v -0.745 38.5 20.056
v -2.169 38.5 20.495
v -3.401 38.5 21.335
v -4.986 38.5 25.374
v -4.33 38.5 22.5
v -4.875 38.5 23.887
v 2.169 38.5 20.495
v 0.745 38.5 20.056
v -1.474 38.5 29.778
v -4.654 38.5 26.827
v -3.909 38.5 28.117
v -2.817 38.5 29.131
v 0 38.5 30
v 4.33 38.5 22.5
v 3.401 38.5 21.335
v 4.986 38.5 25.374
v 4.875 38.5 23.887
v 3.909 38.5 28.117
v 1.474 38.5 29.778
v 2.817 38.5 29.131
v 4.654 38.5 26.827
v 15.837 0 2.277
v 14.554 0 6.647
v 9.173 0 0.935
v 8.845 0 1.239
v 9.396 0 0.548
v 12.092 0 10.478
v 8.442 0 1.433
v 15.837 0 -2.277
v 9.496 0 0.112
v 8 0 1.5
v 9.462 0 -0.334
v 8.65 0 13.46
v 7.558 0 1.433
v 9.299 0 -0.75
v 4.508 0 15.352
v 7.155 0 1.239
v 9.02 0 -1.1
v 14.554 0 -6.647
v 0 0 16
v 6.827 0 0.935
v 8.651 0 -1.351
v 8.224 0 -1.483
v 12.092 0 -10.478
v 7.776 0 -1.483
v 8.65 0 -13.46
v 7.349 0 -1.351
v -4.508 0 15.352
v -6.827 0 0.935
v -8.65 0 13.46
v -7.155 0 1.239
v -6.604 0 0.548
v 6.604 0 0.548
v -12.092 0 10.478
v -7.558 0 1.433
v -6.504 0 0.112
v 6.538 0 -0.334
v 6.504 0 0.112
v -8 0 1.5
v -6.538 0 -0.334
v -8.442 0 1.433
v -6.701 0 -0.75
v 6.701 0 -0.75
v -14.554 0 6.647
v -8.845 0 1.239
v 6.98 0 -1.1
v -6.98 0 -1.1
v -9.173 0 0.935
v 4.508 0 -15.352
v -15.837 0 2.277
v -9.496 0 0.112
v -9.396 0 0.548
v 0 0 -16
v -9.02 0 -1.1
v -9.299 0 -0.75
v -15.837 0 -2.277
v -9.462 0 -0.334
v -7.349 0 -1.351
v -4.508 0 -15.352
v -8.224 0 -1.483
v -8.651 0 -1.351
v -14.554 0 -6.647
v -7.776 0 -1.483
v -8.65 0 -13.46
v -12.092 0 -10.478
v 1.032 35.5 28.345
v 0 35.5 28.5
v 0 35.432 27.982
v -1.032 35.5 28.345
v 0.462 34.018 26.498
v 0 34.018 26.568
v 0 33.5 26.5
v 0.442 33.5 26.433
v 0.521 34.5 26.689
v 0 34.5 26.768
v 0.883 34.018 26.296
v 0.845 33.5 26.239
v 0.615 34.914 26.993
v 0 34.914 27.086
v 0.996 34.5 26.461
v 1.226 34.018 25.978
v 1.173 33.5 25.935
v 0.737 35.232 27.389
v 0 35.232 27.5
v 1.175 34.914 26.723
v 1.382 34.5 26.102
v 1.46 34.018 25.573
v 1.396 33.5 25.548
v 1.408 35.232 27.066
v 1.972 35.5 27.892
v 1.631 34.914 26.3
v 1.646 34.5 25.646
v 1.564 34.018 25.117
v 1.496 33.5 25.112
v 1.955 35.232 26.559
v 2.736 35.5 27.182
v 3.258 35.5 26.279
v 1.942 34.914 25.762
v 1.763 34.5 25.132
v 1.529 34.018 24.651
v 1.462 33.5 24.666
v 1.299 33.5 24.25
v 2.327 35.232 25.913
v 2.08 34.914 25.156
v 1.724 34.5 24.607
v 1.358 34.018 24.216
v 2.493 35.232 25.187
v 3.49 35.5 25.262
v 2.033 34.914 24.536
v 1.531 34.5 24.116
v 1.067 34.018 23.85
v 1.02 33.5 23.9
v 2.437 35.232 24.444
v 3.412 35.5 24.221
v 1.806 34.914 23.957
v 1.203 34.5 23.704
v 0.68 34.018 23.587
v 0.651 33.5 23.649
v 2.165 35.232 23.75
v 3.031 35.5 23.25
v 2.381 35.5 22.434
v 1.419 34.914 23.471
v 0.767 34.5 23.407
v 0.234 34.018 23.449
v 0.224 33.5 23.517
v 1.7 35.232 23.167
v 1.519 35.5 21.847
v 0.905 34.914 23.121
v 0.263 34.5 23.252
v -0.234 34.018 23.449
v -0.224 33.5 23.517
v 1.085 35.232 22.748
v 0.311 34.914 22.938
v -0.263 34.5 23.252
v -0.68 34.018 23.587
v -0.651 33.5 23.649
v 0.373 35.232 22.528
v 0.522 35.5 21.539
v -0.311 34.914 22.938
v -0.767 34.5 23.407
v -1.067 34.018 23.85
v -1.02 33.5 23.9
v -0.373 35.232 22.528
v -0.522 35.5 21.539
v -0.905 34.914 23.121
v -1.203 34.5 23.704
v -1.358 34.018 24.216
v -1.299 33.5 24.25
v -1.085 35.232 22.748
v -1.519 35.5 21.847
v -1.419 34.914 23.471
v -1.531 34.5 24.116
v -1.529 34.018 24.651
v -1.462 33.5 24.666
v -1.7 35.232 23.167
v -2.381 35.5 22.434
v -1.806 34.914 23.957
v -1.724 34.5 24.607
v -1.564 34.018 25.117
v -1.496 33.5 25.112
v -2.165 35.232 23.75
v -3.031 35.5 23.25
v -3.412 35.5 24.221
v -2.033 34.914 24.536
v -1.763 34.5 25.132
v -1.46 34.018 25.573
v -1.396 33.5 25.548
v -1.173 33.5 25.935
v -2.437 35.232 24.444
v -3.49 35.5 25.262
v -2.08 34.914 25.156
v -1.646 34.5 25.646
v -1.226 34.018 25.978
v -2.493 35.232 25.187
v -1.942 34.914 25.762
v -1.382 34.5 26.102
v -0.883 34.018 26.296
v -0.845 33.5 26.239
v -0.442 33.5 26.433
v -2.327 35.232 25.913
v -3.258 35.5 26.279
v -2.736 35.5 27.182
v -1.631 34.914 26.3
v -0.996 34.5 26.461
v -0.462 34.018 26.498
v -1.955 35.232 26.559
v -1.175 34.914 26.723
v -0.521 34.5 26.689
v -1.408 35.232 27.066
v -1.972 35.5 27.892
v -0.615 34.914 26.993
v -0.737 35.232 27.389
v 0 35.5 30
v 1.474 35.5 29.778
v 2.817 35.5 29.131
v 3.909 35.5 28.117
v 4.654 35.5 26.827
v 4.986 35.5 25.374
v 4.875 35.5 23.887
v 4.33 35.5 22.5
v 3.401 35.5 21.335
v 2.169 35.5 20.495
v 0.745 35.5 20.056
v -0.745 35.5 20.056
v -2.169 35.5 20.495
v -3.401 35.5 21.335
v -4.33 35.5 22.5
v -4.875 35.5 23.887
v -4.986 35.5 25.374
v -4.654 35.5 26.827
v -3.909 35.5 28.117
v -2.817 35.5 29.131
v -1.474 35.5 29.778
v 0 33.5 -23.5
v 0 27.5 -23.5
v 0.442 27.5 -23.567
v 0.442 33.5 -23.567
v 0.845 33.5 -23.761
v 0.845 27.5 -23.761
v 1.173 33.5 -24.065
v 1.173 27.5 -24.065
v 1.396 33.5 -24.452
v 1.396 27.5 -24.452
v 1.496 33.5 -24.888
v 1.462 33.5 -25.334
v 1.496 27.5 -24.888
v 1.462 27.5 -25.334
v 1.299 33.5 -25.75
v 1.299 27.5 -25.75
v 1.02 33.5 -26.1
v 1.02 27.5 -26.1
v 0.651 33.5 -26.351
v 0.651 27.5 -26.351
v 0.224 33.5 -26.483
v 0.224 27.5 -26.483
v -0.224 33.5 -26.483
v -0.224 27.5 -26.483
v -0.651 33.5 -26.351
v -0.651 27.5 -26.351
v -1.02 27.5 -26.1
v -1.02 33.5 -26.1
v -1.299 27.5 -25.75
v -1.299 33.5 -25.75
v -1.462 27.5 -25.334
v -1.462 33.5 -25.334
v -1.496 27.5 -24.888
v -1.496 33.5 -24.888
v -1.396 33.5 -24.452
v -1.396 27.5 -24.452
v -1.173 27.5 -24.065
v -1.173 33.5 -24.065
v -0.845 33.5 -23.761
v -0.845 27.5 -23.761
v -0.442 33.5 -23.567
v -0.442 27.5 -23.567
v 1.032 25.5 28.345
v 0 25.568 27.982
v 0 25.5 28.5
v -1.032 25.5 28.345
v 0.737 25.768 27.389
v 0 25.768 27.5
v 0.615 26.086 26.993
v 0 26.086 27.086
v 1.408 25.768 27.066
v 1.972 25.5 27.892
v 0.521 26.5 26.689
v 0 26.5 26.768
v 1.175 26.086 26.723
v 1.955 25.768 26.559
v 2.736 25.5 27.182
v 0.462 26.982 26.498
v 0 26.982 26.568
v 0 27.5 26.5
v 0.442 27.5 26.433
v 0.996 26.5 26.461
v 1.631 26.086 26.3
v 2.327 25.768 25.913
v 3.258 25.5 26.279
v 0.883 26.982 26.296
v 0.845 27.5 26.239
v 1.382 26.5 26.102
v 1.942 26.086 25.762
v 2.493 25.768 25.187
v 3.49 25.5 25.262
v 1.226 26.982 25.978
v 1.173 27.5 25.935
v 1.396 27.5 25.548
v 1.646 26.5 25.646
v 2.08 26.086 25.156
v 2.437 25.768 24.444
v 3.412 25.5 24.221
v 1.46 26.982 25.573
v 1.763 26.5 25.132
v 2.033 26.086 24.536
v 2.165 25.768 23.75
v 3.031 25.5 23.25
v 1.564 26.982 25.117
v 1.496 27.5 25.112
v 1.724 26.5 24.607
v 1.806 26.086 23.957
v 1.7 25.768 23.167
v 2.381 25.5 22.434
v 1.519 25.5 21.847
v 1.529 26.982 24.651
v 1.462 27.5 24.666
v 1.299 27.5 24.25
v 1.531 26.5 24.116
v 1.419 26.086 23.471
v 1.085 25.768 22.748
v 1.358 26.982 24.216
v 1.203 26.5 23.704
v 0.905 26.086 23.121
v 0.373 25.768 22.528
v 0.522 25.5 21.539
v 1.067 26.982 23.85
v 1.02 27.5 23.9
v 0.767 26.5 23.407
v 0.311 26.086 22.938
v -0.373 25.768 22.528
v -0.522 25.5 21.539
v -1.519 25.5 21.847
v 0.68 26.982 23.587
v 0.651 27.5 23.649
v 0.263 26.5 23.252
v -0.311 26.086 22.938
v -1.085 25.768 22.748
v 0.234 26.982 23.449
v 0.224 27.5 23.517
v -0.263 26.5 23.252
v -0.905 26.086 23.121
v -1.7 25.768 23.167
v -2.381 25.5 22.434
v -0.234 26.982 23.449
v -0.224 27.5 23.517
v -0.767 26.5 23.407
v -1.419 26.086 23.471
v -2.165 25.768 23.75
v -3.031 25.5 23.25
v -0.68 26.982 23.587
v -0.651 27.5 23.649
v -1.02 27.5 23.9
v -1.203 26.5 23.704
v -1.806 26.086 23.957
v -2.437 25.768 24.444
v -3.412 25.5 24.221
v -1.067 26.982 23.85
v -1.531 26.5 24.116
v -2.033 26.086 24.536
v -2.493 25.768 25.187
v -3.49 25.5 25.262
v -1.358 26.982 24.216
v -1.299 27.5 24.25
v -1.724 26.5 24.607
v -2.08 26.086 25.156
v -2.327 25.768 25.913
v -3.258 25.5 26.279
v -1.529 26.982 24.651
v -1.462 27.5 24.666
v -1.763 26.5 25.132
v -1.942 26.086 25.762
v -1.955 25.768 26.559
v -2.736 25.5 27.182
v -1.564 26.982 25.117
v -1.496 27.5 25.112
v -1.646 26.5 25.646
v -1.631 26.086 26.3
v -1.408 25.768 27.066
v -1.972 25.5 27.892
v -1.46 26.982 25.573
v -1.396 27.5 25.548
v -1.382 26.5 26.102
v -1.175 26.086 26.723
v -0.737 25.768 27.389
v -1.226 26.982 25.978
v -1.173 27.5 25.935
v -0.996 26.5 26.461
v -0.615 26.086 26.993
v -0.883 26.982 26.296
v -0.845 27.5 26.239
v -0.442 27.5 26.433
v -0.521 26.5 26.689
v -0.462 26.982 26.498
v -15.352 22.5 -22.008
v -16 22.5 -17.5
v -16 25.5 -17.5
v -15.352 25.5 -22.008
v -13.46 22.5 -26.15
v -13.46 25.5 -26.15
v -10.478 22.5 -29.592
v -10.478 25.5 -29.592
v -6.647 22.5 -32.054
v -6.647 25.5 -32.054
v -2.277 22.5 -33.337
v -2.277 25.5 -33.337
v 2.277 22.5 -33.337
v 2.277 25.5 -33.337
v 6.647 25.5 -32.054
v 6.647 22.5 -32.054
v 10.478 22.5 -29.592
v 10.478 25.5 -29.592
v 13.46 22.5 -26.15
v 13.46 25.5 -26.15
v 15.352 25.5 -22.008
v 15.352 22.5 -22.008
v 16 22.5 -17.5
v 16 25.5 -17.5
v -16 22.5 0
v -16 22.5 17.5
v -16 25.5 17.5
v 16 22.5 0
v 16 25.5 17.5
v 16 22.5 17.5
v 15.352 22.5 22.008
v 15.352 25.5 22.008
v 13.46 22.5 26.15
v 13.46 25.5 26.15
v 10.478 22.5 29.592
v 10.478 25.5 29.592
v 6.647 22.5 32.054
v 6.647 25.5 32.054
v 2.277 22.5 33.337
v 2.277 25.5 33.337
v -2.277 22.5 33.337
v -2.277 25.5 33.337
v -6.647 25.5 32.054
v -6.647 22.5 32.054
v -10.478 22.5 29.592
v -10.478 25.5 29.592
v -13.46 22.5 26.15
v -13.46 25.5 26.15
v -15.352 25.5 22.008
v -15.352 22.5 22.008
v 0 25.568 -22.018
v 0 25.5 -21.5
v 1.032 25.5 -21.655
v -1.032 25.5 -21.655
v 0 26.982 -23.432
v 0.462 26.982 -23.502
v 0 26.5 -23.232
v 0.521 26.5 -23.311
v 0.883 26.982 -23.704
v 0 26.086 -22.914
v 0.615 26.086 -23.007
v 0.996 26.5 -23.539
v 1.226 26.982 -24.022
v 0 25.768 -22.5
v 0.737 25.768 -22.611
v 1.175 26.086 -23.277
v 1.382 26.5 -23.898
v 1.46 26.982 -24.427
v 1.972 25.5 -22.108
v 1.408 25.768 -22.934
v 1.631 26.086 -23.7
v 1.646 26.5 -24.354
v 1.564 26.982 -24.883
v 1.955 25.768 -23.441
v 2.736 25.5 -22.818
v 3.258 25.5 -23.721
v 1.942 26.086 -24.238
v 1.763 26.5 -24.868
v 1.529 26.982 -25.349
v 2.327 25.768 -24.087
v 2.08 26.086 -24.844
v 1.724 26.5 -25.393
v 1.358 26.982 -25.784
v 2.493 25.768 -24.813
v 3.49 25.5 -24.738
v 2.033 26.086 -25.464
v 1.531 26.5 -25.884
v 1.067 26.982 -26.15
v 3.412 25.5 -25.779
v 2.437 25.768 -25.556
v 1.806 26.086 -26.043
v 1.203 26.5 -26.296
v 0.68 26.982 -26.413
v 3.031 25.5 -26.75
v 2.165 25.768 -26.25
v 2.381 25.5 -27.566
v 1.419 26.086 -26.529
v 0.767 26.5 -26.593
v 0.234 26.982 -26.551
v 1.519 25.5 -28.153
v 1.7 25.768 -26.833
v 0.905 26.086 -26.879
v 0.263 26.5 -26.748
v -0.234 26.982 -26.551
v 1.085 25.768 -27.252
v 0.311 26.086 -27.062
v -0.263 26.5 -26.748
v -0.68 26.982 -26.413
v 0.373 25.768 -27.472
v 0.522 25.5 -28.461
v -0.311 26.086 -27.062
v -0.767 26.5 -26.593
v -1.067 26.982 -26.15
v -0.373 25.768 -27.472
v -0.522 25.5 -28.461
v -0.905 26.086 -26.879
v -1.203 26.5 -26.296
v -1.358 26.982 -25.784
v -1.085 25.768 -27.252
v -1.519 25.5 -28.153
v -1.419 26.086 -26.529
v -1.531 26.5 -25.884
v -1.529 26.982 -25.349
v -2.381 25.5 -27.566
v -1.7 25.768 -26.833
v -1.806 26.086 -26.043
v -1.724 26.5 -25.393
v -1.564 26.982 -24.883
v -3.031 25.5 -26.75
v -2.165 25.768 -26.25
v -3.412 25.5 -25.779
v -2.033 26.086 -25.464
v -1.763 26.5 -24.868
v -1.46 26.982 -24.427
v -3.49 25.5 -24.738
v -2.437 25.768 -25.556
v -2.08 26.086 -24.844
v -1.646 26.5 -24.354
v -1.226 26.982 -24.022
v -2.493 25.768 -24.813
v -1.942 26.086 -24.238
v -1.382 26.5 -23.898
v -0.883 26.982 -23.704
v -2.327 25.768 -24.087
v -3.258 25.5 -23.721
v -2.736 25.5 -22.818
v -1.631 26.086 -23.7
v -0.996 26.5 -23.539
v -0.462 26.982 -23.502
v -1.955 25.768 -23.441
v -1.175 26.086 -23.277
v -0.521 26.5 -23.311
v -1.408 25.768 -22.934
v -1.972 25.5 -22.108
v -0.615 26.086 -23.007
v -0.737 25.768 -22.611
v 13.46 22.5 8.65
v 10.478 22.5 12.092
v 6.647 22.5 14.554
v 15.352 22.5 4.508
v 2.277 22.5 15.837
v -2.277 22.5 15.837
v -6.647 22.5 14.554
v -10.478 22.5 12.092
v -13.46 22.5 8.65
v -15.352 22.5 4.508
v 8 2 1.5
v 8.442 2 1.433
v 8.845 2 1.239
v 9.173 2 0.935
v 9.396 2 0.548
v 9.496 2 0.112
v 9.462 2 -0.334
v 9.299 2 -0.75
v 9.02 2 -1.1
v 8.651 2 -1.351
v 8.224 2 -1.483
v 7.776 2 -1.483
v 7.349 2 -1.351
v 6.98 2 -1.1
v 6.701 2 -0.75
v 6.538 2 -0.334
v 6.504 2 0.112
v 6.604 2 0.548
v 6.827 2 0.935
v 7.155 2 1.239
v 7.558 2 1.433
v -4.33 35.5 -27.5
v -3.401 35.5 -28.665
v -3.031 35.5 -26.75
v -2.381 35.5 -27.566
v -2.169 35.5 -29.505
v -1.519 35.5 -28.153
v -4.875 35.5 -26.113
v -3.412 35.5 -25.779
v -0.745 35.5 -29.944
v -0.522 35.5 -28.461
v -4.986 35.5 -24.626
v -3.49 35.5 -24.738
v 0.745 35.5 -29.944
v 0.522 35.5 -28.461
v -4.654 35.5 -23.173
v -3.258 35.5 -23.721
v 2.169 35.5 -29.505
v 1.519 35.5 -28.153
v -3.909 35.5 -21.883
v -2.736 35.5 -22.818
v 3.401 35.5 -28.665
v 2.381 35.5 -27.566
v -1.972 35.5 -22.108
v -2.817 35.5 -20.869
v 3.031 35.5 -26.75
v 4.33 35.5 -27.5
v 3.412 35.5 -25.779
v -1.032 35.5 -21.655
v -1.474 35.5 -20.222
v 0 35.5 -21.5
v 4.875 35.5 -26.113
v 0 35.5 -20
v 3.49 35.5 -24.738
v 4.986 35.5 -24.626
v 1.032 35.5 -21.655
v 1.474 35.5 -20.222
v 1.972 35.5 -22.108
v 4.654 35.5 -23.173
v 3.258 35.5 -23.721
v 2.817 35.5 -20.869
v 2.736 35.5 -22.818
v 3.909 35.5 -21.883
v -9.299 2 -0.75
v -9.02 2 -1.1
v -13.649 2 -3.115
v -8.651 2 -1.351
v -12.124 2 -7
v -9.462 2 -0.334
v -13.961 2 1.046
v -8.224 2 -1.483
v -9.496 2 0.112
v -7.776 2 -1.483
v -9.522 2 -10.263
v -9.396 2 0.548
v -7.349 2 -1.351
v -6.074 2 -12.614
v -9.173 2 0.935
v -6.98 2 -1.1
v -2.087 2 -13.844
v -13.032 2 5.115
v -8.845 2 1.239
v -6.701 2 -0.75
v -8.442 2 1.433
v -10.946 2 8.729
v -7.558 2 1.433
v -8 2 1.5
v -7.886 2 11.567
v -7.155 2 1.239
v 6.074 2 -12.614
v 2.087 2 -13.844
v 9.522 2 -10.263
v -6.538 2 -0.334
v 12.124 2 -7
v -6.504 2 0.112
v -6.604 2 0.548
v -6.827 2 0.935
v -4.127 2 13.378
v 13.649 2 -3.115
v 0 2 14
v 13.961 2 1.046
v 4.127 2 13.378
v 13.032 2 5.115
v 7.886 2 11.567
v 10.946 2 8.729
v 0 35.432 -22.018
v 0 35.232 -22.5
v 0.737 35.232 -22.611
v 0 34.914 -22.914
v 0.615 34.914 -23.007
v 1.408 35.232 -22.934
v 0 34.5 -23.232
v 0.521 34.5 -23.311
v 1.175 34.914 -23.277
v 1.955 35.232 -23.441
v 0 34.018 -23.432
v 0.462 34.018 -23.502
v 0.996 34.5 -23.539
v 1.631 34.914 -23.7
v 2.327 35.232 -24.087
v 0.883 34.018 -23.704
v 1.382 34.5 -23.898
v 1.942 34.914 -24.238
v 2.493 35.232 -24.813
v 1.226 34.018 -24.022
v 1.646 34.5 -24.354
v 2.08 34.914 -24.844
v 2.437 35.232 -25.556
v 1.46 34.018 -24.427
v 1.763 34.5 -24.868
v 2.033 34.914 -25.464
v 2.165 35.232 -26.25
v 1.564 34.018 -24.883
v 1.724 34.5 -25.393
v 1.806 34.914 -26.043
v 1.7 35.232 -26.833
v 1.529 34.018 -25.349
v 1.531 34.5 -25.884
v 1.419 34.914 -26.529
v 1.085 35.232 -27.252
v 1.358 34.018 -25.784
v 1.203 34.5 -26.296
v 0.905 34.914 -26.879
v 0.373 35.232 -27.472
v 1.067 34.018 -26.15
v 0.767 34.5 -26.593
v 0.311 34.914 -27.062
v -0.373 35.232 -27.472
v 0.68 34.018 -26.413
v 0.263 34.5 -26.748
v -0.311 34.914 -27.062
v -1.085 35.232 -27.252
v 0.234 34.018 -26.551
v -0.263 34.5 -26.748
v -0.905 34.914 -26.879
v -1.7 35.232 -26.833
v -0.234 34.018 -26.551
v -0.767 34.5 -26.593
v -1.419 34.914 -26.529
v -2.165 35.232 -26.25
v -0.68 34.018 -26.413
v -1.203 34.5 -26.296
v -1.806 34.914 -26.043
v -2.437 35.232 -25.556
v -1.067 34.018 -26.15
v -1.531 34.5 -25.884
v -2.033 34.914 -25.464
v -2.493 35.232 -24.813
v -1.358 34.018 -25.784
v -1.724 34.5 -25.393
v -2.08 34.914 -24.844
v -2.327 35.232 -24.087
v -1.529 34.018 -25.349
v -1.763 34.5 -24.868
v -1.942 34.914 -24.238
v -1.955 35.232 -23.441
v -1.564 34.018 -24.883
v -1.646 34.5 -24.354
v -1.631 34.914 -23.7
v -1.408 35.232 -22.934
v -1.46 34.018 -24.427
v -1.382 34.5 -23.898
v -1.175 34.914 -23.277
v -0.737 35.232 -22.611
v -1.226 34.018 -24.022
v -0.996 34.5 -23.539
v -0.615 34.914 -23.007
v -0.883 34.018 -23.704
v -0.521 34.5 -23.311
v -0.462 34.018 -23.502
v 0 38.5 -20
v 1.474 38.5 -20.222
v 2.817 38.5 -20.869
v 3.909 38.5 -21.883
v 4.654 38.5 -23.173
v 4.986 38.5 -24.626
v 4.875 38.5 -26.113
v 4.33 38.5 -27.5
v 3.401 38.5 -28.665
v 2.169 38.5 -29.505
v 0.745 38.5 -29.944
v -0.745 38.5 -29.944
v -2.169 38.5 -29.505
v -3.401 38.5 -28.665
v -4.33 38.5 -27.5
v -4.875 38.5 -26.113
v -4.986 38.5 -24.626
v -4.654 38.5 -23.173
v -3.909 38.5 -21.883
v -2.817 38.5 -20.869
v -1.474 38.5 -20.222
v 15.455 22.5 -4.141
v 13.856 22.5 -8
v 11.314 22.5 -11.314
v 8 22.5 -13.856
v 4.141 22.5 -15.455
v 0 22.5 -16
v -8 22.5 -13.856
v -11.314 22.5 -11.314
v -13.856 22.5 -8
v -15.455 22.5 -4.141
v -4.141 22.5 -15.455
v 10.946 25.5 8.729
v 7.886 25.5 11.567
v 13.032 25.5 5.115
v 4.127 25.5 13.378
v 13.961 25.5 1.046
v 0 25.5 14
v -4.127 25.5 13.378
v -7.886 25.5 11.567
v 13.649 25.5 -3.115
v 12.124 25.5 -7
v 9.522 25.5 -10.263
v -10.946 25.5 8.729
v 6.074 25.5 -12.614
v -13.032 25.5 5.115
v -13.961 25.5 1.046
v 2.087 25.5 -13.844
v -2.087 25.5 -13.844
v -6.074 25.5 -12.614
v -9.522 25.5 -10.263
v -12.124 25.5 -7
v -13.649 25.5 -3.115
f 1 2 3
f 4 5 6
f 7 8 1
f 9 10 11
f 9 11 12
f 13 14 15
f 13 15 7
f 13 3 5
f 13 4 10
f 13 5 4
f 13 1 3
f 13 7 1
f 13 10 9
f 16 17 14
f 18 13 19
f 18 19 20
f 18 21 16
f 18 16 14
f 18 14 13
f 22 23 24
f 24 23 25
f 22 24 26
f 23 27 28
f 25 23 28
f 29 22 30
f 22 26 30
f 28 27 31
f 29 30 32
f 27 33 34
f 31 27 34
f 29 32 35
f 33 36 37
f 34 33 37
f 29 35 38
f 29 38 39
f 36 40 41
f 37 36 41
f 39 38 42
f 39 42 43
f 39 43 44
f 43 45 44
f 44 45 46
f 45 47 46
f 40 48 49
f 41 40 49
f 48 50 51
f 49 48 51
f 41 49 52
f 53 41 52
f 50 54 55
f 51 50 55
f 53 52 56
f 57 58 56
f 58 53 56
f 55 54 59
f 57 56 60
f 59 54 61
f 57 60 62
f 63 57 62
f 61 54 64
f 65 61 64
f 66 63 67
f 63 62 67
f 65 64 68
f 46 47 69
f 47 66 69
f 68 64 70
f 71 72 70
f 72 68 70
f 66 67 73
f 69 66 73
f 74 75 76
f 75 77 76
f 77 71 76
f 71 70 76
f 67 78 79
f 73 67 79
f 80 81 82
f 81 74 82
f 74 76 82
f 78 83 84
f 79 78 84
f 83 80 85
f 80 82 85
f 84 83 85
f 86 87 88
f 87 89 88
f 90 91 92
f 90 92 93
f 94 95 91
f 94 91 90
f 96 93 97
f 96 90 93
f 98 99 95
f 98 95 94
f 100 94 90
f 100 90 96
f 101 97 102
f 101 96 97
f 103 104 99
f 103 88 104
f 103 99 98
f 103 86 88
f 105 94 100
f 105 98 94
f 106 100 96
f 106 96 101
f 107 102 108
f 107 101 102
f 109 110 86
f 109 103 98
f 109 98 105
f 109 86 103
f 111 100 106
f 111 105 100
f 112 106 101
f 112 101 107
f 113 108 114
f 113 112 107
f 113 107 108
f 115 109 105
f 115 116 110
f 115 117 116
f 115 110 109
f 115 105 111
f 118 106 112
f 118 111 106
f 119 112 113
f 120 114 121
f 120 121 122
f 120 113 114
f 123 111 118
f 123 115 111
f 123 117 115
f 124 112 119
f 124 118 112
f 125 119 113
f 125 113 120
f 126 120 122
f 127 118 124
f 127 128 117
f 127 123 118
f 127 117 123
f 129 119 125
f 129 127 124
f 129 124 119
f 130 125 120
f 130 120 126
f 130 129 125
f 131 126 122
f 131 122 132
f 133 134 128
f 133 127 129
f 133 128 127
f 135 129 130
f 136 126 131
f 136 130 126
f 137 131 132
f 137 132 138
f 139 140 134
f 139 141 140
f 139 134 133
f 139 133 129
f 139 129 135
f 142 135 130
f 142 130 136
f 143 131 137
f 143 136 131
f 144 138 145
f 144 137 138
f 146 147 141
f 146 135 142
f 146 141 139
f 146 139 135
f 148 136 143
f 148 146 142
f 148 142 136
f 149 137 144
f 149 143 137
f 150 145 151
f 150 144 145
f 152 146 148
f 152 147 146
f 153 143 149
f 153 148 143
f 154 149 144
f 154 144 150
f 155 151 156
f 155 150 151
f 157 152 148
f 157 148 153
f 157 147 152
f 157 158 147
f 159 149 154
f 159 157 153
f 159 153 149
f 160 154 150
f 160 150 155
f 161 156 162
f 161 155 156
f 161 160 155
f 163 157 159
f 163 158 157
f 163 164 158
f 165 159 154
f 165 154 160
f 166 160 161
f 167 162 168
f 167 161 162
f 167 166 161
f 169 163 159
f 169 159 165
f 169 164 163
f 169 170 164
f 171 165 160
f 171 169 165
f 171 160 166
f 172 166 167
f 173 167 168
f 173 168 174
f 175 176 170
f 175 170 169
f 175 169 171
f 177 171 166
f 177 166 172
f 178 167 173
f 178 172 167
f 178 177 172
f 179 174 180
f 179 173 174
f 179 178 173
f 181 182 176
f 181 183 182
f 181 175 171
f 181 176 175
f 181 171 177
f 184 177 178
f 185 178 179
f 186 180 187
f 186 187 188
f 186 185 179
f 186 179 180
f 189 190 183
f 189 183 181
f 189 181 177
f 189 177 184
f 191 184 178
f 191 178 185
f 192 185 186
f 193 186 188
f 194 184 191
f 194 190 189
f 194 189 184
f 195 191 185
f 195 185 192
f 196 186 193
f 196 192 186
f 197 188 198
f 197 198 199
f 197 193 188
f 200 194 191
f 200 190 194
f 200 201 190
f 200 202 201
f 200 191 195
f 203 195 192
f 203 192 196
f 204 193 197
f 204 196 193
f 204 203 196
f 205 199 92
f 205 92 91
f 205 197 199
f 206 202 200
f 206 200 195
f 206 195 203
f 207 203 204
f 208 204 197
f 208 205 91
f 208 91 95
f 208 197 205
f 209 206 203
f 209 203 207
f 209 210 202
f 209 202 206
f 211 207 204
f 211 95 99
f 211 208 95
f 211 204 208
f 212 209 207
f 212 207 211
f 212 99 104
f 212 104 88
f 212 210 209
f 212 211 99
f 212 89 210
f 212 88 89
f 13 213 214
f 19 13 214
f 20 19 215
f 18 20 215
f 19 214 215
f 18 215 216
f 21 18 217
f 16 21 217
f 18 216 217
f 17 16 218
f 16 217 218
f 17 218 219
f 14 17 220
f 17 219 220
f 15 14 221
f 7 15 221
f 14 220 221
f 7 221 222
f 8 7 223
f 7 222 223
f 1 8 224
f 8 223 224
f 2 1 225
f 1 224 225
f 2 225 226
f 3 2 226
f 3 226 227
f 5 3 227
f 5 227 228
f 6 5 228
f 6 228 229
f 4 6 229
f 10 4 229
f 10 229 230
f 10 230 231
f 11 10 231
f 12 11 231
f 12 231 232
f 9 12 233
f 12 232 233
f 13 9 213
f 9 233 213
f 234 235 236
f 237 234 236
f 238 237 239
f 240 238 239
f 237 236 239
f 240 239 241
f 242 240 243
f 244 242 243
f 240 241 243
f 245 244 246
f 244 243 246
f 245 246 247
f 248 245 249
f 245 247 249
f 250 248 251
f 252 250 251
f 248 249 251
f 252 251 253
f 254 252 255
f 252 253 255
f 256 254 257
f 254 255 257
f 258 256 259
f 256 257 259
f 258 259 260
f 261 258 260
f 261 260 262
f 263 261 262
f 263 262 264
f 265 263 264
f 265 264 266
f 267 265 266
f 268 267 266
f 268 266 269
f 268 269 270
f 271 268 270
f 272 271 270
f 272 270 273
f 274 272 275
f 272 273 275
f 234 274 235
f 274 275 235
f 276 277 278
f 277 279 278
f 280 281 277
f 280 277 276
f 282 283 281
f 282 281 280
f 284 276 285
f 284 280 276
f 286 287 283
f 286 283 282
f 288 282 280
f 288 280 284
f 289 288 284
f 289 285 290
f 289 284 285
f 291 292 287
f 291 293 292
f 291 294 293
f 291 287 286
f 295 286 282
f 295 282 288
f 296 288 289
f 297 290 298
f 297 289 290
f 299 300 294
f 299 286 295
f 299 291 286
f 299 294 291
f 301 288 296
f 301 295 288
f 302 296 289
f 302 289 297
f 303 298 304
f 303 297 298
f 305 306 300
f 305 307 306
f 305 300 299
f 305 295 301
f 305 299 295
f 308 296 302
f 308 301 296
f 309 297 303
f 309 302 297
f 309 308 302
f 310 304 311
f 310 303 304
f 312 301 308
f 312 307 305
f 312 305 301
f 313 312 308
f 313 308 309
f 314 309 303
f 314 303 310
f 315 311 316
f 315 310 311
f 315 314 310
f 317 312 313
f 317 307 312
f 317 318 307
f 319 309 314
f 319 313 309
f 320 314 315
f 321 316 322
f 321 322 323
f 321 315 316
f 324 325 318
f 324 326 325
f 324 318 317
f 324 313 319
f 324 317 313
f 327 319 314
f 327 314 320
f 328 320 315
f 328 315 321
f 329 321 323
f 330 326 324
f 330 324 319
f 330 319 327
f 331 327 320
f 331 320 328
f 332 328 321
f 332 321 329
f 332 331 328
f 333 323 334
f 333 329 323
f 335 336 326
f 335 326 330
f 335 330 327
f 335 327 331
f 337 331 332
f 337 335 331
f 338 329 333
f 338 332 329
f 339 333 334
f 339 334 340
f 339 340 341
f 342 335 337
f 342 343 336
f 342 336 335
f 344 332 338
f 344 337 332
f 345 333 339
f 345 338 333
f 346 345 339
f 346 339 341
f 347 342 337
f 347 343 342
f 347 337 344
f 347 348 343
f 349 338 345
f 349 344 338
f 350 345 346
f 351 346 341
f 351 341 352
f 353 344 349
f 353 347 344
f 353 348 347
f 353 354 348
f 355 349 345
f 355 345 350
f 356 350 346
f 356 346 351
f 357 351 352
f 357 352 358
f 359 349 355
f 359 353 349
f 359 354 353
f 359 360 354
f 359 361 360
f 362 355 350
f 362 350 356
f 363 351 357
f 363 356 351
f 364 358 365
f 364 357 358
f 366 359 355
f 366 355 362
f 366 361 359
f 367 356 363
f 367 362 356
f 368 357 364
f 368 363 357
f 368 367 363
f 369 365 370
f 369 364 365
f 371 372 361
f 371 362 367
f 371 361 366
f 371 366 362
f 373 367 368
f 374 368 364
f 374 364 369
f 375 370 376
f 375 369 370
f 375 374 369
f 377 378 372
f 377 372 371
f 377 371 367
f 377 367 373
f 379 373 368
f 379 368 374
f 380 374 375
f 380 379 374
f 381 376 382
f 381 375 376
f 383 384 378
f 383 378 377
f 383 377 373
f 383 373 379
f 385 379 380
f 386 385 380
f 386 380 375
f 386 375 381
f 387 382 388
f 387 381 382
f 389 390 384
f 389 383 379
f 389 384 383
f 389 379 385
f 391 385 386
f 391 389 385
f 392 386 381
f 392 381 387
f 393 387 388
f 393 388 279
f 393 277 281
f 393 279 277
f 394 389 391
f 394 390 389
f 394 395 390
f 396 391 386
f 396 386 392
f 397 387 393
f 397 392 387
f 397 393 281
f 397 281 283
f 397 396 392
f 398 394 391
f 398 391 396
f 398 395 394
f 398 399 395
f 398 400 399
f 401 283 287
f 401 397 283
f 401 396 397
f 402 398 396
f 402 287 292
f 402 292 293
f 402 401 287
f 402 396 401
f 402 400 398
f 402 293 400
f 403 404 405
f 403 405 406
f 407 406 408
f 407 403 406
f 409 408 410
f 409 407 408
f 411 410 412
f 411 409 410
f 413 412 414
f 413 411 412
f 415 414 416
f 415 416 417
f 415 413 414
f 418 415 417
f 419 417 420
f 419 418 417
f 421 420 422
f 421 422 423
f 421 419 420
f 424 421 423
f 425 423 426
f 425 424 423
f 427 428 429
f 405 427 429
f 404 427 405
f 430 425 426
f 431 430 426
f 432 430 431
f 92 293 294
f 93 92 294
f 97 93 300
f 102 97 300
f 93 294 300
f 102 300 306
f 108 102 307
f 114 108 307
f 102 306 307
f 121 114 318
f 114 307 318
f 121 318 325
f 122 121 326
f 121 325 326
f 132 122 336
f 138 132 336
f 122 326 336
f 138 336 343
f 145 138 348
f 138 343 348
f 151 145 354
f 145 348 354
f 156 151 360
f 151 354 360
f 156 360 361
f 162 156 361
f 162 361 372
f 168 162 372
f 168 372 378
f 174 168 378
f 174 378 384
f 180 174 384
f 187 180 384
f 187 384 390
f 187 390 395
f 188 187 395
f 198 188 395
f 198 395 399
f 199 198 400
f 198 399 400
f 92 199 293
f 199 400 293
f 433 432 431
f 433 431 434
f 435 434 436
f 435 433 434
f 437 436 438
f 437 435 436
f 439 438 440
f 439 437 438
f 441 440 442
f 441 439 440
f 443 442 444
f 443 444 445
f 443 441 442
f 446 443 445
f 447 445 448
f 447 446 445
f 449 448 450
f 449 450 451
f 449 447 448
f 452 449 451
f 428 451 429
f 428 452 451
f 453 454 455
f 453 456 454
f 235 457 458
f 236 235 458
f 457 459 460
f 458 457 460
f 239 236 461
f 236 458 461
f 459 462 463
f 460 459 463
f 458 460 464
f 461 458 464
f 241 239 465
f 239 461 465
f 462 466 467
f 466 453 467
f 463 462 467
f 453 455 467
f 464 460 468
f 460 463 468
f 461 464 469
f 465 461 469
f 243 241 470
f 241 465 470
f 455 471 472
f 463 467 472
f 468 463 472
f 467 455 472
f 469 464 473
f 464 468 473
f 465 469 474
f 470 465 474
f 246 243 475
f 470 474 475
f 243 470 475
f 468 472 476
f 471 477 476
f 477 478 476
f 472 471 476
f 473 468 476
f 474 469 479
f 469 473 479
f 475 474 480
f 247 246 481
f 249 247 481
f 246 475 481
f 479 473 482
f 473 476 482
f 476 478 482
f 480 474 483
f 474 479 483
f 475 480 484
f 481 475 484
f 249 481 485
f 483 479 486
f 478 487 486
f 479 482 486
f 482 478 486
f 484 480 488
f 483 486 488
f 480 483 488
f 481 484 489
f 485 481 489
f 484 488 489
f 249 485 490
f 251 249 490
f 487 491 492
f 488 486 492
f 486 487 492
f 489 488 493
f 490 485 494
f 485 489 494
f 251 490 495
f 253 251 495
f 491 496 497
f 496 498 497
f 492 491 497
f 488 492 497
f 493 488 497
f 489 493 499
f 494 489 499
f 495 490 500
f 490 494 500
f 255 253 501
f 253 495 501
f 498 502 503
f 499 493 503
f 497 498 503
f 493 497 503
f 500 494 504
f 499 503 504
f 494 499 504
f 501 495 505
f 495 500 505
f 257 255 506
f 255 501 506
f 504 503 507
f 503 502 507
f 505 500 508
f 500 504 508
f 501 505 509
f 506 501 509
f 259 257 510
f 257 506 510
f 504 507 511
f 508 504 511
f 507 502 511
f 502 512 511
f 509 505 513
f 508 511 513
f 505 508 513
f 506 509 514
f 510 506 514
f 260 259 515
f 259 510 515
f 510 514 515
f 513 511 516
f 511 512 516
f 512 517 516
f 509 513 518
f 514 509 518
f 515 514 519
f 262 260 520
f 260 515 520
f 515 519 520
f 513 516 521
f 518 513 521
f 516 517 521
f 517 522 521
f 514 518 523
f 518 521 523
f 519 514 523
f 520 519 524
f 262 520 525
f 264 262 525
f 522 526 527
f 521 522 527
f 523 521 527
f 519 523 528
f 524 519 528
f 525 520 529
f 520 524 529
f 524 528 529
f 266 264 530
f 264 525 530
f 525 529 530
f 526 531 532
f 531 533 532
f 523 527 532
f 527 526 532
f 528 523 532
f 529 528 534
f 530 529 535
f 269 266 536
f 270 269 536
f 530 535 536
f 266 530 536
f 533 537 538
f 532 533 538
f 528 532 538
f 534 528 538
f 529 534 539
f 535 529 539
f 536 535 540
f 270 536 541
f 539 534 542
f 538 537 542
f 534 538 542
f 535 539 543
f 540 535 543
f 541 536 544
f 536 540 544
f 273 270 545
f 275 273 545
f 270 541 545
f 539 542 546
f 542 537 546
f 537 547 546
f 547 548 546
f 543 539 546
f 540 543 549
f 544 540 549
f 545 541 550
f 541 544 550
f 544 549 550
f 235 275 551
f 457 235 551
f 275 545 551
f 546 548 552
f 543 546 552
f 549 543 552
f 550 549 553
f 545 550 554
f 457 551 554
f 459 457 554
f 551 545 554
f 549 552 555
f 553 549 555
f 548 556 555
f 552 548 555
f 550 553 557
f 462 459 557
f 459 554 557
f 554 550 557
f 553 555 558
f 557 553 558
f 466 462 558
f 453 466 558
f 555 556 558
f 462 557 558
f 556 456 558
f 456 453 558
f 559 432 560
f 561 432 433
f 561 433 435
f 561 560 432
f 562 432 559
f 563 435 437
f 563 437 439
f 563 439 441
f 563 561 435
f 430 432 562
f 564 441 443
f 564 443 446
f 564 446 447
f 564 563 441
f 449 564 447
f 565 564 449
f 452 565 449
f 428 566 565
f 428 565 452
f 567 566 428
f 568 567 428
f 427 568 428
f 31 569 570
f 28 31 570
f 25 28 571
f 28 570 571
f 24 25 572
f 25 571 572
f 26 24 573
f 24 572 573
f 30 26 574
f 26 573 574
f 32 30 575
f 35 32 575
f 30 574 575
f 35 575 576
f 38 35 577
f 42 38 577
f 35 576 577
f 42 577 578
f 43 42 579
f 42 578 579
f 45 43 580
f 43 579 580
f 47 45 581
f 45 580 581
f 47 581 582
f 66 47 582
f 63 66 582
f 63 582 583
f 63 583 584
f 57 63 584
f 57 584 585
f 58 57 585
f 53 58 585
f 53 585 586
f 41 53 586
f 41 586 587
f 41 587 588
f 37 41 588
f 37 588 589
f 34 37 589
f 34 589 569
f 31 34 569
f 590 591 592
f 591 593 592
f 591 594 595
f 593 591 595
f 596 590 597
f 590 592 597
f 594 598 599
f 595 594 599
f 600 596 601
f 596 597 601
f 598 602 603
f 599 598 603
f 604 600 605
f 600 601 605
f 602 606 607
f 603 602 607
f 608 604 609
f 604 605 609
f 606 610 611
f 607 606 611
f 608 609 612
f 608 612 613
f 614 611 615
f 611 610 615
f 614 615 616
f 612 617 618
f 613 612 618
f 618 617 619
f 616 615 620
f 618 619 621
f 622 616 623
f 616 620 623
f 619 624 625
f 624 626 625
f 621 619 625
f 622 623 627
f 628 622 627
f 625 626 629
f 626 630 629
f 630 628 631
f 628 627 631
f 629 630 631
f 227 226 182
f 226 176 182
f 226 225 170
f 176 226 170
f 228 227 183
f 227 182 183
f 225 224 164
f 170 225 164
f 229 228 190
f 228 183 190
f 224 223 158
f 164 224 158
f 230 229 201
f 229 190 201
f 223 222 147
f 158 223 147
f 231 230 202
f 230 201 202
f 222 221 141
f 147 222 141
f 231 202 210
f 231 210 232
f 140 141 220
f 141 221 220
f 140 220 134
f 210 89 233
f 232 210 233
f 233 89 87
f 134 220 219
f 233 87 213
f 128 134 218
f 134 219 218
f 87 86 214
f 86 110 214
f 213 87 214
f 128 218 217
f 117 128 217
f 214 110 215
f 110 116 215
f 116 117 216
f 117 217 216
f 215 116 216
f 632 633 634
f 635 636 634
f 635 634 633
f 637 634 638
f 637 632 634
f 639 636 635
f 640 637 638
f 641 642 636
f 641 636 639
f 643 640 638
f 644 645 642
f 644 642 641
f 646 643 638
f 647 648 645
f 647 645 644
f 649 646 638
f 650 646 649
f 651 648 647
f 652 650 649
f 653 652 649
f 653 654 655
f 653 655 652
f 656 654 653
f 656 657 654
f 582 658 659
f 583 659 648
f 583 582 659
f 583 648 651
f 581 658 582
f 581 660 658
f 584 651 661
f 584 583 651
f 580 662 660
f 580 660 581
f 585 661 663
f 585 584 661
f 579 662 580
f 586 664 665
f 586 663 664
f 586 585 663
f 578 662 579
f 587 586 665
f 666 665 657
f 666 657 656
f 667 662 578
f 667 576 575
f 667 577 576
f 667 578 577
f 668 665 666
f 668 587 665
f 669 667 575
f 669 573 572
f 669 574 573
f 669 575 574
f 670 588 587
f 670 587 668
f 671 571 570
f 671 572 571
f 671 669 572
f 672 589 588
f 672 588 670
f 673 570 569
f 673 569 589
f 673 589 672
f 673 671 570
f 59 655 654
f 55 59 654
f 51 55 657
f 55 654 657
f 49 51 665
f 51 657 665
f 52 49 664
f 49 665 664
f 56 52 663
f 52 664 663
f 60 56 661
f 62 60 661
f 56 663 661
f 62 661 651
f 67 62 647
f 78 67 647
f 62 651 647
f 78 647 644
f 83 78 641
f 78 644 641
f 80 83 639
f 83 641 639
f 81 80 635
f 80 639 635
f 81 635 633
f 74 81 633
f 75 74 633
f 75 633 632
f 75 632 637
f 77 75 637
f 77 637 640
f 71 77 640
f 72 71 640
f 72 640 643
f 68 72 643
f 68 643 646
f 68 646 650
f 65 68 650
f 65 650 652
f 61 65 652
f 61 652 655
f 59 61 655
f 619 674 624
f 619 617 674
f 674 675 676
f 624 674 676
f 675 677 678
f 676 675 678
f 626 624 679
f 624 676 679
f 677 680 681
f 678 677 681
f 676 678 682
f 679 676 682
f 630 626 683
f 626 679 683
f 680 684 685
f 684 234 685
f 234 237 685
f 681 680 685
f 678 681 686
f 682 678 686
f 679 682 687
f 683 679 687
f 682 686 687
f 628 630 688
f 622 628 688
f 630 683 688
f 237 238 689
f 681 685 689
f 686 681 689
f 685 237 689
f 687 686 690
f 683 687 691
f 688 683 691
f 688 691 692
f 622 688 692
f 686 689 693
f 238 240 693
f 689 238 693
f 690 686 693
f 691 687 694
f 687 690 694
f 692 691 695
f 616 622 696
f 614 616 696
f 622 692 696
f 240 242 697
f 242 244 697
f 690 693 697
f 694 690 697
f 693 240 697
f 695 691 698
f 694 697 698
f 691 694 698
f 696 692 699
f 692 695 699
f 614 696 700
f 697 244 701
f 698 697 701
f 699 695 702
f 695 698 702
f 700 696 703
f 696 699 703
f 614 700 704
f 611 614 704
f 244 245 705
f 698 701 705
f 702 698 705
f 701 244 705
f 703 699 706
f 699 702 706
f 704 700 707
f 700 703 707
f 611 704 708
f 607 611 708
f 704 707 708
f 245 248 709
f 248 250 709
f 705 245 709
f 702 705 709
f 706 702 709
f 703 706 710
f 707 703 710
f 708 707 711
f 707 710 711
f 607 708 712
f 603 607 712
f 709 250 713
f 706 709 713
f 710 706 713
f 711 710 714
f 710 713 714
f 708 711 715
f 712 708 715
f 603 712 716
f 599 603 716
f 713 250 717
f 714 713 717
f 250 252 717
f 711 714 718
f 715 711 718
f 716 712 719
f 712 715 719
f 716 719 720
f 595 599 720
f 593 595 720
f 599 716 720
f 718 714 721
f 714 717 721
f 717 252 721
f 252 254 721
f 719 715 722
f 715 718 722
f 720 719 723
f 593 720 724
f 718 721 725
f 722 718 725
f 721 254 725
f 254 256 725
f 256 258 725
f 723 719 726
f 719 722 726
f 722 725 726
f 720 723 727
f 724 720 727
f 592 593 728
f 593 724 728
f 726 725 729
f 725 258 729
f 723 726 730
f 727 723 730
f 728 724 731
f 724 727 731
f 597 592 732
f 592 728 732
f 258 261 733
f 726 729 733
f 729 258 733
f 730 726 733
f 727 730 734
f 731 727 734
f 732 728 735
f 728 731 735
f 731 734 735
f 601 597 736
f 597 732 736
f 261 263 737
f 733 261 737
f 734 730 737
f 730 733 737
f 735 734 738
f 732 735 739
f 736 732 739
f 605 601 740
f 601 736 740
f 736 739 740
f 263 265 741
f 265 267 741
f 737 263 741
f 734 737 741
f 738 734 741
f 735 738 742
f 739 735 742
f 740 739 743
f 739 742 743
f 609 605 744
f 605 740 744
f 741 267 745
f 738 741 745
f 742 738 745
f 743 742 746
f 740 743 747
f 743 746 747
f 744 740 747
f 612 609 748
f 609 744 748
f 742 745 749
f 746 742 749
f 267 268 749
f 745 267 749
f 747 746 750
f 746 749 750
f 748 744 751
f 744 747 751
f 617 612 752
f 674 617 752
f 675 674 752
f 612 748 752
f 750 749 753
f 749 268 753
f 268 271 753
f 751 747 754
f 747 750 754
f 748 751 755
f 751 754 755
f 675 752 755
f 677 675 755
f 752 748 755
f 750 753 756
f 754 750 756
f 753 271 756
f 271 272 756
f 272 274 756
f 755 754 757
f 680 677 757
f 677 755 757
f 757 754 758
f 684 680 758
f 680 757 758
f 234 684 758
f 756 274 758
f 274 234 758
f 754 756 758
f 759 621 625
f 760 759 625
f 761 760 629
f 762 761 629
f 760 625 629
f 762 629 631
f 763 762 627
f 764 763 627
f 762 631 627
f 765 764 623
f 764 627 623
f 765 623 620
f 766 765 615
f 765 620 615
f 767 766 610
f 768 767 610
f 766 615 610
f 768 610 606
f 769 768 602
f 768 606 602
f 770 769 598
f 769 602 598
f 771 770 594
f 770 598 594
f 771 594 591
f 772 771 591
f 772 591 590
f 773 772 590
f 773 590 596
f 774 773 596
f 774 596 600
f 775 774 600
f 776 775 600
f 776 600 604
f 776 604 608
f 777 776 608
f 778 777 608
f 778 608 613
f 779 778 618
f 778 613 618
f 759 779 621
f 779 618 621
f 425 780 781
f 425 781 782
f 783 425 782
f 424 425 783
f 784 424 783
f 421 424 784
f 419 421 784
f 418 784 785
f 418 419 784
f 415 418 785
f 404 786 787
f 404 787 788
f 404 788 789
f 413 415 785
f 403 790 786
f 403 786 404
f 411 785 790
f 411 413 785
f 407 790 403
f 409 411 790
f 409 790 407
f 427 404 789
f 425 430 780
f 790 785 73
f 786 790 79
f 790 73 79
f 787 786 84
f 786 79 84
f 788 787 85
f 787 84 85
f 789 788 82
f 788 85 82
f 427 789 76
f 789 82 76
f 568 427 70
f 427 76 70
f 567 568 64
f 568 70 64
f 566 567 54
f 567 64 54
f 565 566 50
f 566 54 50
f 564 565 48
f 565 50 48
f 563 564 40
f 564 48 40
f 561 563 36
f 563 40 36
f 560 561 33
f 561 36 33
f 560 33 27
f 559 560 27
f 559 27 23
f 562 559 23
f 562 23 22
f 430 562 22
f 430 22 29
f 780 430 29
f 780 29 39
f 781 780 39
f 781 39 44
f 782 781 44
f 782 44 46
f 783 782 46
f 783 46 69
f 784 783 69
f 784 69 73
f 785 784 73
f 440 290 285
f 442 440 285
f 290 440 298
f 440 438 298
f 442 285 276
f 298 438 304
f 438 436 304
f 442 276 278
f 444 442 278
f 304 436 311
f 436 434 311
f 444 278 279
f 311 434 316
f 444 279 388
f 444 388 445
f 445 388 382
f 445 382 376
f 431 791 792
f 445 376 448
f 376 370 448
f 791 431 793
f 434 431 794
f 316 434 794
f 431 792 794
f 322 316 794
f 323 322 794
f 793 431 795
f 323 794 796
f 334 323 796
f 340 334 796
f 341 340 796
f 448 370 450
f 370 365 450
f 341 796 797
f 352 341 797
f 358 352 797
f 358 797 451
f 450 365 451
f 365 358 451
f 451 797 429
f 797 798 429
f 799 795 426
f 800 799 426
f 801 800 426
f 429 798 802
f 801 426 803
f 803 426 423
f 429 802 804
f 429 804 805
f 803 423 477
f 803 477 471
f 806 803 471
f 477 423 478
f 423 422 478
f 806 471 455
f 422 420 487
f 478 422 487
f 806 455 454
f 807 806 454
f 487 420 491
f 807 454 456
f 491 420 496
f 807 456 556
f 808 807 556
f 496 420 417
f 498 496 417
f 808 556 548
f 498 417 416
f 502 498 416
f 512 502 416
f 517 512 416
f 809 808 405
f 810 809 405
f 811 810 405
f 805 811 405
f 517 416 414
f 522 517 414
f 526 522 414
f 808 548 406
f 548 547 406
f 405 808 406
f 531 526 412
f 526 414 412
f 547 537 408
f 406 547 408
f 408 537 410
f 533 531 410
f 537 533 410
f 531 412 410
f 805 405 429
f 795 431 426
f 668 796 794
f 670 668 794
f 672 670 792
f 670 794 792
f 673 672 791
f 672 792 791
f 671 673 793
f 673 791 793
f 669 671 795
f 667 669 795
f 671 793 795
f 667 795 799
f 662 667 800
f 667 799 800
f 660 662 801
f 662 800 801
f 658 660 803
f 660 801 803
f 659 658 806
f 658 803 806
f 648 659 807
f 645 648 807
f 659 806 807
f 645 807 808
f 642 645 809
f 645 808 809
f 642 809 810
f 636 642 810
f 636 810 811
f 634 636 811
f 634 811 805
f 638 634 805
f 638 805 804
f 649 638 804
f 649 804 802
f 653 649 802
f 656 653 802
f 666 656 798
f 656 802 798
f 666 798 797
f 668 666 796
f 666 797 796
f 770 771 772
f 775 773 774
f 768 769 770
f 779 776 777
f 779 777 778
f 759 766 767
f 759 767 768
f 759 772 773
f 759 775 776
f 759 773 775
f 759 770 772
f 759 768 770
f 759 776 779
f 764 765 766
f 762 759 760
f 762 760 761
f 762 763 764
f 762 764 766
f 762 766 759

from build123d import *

# Parameters (mm, degrees)
SKETCH1_R           = 16
BOSS_EXTRUDE1_DEPTH = 22.5
BOSS_EXTRUDE2_DEPTH = 3
SKETCH3_R           = 1.5
BOSS_EXTRUDE3_DEPTH = 10
SKETCH4_R           = 14
CUT_EXTRUDE1_DEPTH  = 23.5
SKETCH5_R           = 1.5
CUT_EXTRUDE2_DEPTH  = 51.00499975
SKETCH7_R           = 5
BOSS_EXTRUDE4_DEPTH = 3
FILLET1_R           = 2


with BuildPart() as part:
    # Sketch1 → Boss-Extrude1 (new body)
    with BuildSketch(Plane(origin=(0, 0, 0), x_dir=(1, 0, 0), z_dir=(0, 1, 0))):
        with Locations(Location((0, 0, 0), (0, 0, 90))):
            Circle(SKETCH1_R)
    extrude(amount=BOSS_EXTRUDE1_DEPTH)

    # Sketch2 → Boss-Extrude2 (add)
    with BuildSketch(Plane(origin=(0, 22.5, 0), x_dir=(1, 0, 0), z_dir=(0, 1, 0))):
        with BuildLine():
            Line((-16, -17.5), (-16, 17.5))
            ThreePointArc((-16, 17.5), (0, 33.5), (16, 17.5))
            Line((16, 17.5), (16, -17.5))
            ThreePointArc((16, -17.5), (0, -33.5), (-16, -17.5))
        make_face()
    extrude(amount=BOSS_EXTRUDE2_DEPTH)

    # Sketch3 → Boss-Extrude3 (add)
    with BuildSketch(Plane(origin=(0, 25.5, 0), x_dir=(1, 0, 0), z_dir=(0, 1, 0))):
        with Locations(Location((0, 25, 0), (0, 0, 270))):
            Circle(SKETCH3_R)
        with Locations(Location((0, -25, 0), (0, 0, 270))):
            Circle(SKETCH3_R)
    extrude(amount=BOSS_EXTRUDE3_DEPTH)

    # Sketch4 → Cut-Extrude1 (cut)
    with BuildSketch(Plane(origin=(0, 25.5, 0), x_dir=(1, 0, 0), z_dir=(0, 1, 0))):
        with Locations(Location((0, 0, 0), (0, 0, 270))):
            Circle(SKETCH4_R)
    extrude(amount=-CUT_EXTRUDE1_DEPTH, mode=Mode.SUBTRACT)

    # Sketch5 → Cut-Extrude2 (cut, through all)
    with BuildSketch(Plane(origin=(0, 2, 0), x_dir=(1, 0, 0), z_dir=(0, 1, 0))):
        with Locations(Location((8, 0, 0), (0, 0, 270))):
            Circle(SKETCH5_R)
        with Locations(Location((-8, 0, 0), (0, 0, 270))):
            Circle(SKETCH5_R)
    extrude(amount=-CUT_EXTRUDE2_DEPTH, mode=Mode.SUBTRACT)

    # Sketch7 → Boss-Extrude4 (add)
    with BuildSketch(Plane(origin=(0, 35.5, 0), x_dir=(1, 0, 0), z_dir=(0, 1, 0))):
        with Locations(Location((0, 25, 0), (0, 0, 270))):
            Circle(SKETCH7_R)
        with Locations(Location((0, -25, 0), (0, 0, 270))):
            Circle(SKETCH7_R)
    extrude(amount=BOSS_EXTRUDE4_DEPTH)

    # Fillet1
    fillet1_edges = [part.edges().sort_by_distance(p)[0] for p in [
        (0, 25.5, -26.5),
        (0, 35.5, -26.5),
        (0, 25.5, 23.5),
        (0, 35.5, 23.5),
    ]]
    fillet(fillet1_edges, radius=FILLET1_R)


solid = part.part
